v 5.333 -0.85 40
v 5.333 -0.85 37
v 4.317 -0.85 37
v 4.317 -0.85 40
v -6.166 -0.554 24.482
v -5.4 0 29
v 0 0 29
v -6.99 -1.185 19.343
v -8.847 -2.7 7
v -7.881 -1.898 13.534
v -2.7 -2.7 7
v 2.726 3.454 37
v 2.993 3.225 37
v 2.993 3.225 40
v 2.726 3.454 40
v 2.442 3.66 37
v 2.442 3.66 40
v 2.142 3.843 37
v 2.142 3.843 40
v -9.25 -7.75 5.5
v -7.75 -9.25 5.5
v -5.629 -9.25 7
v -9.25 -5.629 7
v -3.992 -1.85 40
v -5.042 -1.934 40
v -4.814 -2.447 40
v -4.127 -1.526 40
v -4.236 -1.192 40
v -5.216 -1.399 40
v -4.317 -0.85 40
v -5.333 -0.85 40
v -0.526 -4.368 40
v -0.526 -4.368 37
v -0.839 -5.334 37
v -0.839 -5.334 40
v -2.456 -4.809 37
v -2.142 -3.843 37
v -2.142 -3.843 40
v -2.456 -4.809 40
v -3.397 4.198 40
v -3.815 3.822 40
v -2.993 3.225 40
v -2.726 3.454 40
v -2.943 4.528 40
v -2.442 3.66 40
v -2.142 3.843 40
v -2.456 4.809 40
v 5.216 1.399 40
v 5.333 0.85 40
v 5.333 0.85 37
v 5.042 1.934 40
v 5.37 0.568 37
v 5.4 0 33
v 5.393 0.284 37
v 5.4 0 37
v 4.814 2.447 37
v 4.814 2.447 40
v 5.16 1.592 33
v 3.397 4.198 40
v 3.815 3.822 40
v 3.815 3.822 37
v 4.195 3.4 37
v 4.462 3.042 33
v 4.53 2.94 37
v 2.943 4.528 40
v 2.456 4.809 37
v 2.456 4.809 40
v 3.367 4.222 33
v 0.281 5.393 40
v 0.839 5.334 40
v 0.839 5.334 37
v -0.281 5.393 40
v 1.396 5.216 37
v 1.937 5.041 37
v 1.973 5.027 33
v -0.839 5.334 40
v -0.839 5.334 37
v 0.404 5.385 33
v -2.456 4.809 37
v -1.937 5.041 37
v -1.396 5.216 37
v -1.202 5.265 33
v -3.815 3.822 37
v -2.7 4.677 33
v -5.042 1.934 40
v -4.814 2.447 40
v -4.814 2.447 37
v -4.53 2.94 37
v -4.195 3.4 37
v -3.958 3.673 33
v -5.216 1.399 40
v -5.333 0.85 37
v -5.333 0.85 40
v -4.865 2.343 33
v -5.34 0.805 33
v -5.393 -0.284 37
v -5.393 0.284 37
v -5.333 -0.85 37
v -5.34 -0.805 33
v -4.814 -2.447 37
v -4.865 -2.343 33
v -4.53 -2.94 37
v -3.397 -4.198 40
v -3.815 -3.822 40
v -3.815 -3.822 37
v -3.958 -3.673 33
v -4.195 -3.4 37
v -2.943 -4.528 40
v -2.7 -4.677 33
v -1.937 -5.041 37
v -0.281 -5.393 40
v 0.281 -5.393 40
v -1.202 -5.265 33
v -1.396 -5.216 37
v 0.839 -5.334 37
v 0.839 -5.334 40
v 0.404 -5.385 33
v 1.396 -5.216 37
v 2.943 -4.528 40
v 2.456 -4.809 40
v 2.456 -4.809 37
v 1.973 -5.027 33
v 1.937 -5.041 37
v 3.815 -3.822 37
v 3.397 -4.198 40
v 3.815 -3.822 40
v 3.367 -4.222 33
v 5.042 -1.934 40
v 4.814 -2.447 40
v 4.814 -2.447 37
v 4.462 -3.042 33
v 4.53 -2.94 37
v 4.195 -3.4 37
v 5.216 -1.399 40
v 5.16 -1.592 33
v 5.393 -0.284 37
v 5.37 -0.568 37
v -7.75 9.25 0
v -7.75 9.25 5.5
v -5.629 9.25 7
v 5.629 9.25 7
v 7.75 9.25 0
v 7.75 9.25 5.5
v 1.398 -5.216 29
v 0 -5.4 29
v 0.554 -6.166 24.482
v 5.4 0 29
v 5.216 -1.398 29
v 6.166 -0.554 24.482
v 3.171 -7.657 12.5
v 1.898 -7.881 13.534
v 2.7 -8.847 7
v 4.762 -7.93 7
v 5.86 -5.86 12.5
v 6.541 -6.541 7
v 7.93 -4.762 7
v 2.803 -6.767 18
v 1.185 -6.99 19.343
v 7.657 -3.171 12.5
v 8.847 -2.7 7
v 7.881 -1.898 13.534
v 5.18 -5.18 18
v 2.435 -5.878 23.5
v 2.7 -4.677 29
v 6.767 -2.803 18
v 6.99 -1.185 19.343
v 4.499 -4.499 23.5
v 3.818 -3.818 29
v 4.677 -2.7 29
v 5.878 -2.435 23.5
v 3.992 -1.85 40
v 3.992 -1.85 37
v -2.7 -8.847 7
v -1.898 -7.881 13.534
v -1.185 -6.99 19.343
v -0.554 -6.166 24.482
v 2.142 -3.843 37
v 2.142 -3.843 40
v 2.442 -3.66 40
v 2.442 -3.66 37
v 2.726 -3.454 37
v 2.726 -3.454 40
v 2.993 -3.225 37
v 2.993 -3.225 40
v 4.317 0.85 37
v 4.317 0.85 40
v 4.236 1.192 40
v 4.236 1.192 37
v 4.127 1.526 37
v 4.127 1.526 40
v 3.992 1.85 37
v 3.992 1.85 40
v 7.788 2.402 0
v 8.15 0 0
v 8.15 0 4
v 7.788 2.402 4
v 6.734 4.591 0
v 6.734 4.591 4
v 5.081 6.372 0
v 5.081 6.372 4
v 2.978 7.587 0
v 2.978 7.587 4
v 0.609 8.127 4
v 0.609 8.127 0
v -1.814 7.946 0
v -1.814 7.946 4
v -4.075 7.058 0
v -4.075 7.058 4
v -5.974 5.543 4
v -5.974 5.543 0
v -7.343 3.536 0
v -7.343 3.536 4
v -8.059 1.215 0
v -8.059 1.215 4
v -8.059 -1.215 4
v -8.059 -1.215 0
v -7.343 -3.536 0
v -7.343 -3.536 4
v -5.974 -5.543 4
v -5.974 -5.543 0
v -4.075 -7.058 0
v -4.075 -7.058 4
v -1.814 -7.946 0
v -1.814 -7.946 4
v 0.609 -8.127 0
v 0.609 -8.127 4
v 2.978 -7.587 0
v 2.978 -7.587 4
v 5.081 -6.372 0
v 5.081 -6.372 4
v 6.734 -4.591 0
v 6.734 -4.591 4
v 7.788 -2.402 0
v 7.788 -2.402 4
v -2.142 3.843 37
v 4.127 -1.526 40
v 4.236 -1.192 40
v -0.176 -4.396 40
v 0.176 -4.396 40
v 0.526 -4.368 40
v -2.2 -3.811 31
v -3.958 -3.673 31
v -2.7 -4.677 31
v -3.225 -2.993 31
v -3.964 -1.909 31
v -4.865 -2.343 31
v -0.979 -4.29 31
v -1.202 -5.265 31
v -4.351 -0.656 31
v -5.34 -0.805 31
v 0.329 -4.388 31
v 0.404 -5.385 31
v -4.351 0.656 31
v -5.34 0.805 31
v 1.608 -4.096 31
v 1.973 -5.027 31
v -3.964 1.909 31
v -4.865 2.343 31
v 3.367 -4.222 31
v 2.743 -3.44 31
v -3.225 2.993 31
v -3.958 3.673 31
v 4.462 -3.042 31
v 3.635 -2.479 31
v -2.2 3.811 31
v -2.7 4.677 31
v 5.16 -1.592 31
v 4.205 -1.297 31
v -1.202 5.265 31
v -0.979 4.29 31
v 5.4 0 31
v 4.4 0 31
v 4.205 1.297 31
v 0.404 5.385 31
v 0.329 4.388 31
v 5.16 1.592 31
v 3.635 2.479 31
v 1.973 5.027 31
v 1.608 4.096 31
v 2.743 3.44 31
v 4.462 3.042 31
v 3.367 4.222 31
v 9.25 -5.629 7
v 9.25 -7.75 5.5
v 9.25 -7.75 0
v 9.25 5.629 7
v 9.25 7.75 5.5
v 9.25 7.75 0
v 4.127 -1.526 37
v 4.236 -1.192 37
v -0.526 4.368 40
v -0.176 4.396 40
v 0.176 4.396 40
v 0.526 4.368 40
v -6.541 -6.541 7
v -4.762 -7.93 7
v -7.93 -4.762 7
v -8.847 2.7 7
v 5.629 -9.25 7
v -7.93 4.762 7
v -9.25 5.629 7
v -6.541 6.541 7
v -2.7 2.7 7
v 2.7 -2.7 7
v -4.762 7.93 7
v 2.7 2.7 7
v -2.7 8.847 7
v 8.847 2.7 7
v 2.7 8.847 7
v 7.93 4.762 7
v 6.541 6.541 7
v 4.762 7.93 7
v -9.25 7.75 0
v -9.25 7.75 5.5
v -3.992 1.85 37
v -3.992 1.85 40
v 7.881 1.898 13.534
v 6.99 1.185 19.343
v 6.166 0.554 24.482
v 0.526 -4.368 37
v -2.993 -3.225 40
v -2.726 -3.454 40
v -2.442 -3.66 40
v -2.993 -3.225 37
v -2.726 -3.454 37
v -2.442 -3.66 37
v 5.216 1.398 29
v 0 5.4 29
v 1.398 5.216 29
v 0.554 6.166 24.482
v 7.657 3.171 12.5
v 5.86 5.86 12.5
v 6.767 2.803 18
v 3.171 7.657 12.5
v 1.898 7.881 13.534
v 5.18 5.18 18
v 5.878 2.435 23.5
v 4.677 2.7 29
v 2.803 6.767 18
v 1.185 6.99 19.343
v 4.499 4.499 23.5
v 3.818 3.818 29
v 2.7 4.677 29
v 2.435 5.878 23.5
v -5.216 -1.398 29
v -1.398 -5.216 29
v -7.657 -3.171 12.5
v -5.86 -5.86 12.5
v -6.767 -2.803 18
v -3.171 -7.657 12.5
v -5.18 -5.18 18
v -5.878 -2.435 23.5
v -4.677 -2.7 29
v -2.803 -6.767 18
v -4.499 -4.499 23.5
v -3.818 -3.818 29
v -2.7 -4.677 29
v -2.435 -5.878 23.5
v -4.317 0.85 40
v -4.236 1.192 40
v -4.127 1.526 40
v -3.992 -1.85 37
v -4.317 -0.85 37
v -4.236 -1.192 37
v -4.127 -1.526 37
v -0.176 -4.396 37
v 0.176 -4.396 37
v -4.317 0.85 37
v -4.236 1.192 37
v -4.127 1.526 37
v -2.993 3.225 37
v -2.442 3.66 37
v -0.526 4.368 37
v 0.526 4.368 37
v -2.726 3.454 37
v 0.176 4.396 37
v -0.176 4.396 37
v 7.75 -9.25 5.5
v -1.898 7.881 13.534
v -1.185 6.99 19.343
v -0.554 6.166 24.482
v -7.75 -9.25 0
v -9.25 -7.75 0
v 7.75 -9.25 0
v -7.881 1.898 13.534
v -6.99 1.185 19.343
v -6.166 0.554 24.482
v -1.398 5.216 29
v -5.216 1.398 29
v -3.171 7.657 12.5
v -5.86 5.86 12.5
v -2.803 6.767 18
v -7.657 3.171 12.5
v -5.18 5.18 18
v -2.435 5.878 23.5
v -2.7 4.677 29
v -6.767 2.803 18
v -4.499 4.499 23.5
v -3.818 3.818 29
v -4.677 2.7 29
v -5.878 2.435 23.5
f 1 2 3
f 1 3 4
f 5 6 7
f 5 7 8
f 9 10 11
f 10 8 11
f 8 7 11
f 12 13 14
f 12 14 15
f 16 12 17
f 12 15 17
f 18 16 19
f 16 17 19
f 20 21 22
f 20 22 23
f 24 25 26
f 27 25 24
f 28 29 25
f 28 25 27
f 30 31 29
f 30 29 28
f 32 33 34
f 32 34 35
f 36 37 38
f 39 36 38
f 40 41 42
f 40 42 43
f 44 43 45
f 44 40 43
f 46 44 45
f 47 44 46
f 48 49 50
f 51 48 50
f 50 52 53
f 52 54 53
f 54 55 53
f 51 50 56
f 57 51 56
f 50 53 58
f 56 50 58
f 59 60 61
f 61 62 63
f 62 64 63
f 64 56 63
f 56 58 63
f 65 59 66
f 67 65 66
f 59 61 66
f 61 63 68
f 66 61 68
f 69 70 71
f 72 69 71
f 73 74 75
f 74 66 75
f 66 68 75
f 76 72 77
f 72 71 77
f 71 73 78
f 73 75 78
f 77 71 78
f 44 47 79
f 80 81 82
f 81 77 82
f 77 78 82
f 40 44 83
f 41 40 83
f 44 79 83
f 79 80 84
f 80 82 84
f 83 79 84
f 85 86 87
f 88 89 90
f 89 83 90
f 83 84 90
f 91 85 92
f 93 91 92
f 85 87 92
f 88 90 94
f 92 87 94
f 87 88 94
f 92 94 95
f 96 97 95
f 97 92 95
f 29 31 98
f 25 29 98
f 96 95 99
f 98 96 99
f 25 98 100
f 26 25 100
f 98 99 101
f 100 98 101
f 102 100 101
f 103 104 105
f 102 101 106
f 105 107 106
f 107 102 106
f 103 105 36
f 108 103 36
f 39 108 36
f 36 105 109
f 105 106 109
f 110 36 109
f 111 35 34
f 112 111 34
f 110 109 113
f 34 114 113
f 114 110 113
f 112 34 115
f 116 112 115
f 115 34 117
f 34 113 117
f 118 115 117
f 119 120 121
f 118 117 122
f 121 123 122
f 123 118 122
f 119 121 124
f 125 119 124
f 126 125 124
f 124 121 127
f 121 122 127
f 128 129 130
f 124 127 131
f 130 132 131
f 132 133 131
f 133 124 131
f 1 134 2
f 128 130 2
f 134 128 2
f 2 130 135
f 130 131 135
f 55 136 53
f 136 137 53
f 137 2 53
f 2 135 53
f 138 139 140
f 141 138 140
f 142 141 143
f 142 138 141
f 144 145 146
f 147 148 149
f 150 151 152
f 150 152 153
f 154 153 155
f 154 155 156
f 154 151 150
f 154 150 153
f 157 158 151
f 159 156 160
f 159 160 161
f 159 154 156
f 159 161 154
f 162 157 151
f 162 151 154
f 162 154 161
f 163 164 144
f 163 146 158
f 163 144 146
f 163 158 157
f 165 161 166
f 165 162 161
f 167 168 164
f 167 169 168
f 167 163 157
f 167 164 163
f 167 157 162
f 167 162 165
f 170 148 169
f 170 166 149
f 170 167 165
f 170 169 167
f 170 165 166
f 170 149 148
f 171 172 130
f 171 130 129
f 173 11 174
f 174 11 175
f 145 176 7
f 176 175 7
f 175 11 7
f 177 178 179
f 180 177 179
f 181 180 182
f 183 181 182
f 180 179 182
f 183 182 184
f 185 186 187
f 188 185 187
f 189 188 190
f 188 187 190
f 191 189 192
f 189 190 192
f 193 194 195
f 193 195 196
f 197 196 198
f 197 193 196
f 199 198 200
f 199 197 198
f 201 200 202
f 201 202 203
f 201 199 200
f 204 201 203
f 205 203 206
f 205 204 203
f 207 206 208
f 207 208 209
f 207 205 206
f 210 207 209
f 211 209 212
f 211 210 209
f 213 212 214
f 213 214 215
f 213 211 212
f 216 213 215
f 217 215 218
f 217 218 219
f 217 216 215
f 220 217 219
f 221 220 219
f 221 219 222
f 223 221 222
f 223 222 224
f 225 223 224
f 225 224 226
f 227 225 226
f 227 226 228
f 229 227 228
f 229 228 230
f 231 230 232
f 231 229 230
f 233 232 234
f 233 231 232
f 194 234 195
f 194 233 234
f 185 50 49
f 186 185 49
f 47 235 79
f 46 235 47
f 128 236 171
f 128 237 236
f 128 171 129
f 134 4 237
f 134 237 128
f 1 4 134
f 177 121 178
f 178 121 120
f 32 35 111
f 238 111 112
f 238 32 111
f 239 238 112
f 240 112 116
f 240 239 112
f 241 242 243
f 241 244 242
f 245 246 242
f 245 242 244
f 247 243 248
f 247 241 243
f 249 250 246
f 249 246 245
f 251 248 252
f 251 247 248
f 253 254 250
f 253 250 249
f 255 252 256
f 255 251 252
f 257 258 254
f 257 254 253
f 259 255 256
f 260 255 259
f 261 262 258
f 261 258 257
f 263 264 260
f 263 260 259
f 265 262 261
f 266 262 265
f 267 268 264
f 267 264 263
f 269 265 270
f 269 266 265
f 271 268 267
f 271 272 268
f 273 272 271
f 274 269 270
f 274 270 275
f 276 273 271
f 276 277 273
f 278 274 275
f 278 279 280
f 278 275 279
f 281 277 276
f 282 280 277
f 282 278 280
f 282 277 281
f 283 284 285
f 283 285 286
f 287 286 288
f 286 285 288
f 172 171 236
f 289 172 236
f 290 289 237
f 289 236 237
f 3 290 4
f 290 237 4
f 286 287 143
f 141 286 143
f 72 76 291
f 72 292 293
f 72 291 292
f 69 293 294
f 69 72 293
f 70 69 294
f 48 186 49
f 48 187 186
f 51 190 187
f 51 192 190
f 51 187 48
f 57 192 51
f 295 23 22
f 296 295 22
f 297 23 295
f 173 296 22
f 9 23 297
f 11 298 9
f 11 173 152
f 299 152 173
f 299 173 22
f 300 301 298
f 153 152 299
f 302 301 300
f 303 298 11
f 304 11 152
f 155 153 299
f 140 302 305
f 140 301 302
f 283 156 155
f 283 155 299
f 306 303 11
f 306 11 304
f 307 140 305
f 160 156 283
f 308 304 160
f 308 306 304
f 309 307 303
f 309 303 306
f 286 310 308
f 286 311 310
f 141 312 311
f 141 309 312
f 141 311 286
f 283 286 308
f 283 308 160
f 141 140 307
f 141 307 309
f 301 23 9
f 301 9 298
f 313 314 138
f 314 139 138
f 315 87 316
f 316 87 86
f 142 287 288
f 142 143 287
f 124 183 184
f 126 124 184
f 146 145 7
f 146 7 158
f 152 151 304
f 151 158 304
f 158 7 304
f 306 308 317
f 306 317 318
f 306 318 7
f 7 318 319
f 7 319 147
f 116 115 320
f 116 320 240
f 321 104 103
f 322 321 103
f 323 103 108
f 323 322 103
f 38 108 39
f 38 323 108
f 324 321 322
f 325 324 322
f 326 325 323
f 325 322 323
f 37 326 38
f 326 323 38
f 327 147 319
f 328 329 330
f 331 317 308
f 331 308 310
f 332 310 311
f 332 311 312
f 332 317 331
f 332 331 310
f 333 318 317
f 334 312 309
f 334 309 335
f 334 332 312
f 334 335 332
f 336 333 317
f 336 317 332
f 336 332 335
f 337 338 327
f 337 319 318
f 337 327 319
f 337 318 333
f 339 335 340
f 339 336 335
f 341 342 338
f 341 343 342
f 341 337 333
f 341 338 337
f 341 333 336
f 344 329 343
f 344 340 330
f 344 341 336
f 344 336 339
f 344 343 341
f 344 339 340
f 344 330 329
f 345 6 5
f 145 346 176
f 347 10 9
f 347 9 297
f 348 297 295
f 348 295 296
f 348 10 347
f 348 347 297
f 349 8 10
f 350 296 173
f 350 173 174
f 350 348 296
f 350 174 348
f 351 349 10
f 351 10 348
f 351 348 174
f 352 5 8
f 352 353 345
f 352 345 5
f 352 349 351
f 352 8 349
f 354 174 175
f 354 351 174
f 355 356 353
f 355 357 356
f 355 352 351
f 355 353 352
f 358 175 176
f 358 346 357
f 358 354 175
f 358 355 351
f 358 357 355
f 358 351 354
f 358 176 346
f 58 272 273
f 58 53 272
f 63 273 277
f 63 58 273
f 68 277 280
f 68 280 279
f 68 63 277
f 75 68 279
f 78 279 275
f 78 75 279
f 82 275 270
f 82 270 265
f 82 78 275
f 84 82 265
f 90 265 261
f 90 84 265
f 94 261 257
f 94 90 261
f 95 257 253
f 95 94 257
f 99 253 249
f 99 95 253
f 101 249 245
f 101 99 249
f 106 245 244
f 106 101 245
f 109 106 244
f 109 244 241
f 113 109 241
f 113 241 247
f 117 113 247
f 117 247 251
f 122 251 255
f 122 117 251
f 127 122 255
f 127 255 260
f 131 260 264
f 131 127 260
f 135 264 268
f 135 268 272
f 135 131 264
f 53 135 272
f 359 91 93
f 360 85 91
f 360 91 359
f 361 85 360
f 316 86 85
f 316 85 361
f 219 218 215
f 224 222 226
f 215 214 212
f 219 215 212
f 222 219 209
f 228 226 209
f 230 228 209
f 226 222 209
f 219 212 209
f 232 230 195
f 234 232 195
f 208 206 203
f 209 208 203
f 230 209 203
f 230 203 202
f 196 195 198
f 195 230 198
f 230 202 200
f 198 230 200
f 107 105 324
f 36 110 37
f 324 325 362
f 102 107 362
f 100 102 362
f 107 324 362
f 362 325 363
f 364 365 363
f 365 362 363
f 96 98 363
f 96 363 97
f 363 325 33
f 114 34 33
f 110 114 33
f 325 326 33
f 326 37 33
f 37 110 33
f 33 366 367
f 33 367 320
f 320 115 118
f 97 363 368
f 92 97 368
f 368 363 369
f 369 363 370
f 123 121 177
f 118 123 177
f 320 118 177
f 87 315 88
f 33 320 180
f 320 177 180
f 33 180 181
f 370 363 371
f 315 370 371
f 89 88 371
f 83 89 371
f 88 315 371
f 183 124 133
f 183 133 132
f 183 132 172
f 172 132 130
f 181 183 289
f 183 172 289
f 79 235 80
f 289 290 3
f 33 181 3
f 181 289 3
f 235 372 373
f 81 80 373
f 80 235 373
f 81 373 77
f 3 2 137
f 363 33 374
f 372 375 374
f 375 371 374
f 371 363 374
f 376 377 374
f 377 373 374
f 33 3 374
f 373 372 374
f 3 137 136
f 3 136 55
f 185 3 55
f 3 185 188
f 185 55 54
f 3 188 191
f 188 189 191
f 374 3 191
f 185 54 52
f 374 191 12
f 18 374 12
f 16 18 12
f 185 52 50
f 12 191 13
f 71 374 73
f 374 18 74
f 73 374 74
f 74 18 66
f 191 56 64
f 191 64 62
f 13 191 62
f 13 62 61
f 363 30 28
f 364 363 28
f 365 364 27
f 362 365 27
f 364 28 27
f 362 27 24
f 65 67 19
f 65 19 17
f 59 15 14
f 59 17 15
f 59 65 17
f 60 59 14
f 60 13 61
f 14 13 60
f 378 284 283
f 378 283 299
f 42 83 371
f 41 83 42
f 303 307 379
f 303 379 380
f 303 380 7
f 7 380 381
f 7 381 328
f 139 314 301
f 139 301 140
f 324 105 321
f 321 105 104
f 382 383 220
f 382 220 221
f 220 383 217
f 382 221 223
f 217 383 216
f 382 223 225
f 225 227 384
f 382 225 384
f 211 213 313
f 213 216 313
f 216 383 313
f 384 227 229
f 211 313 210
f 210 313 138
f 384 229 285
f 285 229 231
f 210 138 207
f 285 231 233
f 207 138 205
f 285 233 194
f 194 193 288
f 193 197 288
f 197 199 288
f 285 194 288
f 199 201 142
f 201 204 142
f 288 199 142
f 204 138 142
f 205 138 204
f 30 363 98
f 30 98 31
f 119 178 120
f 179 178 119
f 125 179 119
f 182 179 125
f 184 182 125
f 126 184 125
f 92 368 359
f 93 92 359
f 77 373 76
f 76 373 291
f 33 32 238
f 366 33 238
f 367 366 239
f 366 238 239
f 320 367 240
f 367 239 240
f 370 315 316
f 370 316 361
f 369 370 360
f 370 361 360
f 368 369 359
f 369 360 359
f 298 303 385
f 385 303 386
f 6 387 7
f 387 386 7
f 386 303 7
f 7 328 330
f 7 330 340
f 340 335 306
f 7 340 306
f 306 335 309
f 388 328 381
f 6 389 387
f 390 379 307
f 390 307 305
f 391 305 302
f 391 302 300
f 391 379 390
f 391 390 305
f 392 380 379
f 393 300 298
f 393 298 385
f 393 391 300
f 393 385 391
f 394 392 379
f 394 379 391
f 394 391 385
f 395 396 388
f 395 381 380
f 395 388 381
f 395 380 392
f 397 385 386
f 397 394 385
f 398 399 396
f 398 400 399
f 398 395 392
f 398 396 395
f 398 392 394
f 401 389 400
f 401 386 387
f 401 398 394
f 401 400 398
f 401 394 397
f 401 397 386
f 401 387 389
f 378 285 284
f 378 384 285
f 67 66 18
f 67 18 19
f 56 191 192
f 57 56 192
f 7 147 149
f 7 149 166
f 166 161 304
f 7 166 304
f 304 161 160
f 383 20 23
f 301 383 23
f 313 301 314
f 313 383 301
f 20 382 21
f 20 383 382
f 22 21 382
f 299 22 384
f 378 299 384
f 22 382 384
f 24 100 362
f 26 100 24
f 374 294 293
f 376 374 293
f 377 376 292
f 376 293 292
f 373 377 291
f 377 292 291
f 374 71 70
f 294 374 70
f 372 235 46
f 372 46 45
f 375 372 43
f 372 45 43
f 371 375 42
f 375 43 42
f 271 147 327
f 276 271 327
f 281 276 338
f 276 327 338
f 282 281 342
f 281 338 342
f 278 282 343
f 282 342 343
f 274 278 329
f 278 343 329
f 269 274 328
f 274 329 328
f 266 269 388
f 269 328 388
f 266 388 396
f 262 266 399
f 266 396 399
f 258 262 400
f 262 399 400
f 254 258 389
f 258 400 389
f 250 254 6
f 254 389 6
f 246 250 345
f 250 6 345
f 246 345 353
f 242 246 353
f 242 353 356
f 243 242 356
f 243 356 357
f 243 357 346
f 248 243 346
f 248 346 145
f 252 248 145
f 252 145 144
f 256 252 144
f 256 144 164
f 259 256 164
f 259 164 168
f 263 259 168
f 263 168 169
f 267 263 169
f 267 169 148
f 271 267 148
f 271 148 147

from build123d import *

# Parameters (mm, degrees)
SKETCH_W              = 18.5
SKETCH_H              = 18.5
SKETCH_R              = 8.15
PAD_DEPTH             = 4
SKETCH001_W           = 18.5
SKETCH001_H           = 18.5
PAD001_DEPTH          = 3
SKETCH002_R           = 9.25
SKETCH003_R           = 5.4
SKETCH005_R           = 5.4
PAD002_DEPTH          = 2
CHAMFER_SIZE          = 1.5
CHAMFER001_SIZE       = 1.5
POCKET_DEPTH          = 99.630527
POLARPATTERN_COUNT    = 4
SKETCH007_R           = 4.4
SKETCH008_R           = 5.4
SKETCH009_R           = 5.4
PAD003_DEPTH          = 7
SKETCH010_R           = 4.4
POCKET001_DEPTH       = 3
SKETCH011_W           = 1.7
SKETCH011_H           = 3
POCKET002_DEPTH       = 114.093887
POLARPATTERN001_COUNT = 5


with BuildPart() as part:
    # Sketch → Pad (new body)
    with BuildSketch(Plane.XY):
        Rectangle(SKETCH_W, SKETCH_H)
        Circle(SKETCH_R, mode=Mode.SUBTRACT)
    extrude(amount=PAD_DEPTH)

    # Sketch001 (on Face7 of Pad) → Pad001 (join)
    with BuildSketch(Plane.XY.offset(4)):
        Rectangle(SKETCH001_W, SKETCH001_H)
    extrude(amount=PAD001_DEPTH)

    # Sketch002 (on Face10 of Pad001) → AdditiveLoft section 0
    with BuildSketch(Plane.XY.offset(7)):
        Circle(SKETCH002_R)
    # Sketch003 (on Face10 of Pad001) → AdditiveLoft section 1
    with BuildSketch(Plane.XY.offset(29)):
        Circle(SKETCH003_R)
    loft()

    # Sketch005 (on Face17 of AdditiveLoft) → Pad002 (join)
    with BuildSketch(Plane.XY.offset(29)):
        Circle(SKETCH005_R)
    extrude(amount=PAD002_DEPTH)

    # Chamfer
    chamfer_edges = [part.edges().sort_by_distance(p)[0] for p in [
        (-9.25, -9.25, 5.5),
        (-9.25, -9.25, 2),
        (9.25, -9.25, 5.5),
        (9.25, -9.25, 2),
        (9.25, 9.25, 2),
        (9.25, 9.25, 5.5),
        (-9.25, 9.25, 5.5),
        (-9.25, 9.25, 2),
    ]]
    chamfer(chamfer_edges, length=CHAMFER_SIZE)

    # Chamfer001
    chamfer001_edges = [part.edges().sort_by_distance(p)[0] for p in [
        (8.5, -8.5, 7),
        (-8.5, -8.5, 7),
        (-8.5, 8.5, 7),
        (8.5, 8.5, 7),
    ]]
    chamfer(chamfer001_edges, length=CHAMFER001_SIZE)

    # Sketch006 (on Face19 of Chamfer001) → Pocket (cut, through all)
    with BuildSketch(Plane.YZ.offset(9.25)):
        Polygon((0, 29), (-2.7, 7), (2.7, 7), align=None)
    pocket = extrude(amount=-POCKET_DEPTH, mode=Mode.SUBTRACT)

    # PolarPattern: Pocket ×4 about axis
    polarpattern_axis = Axis((0, 0, 0), (0, 0, 1))
    for i in range(1, POLARPATTERN_COUNT):
        add(pocket.rotate(polarpattern_axis, i * 360 / POLARPATTERN_COUNT), mode=Mode.SUBTRACT)

    # Sketch007 (on Face47 of PolarPattern) → AdditiveLoft001 section 0
    with BuildSketch(Plane.XY.offset(31)):
        Circle(SKETCH007_R)
    # Sketch008 → AdditiveLoft001 section 1
    with BuildSketch(Plane.XY.offset(33)):
        Circle(SKETCH008_R)
    loft()

    # Sketch009 (on Face56 of AdditiveLoft001) → Pad003 (join)
    with BuildSketch(Plane.XY.offset(33)):
        Circle(SKETCH009_R)
    extrude(amount=PAD003_DEPTH)

    # Sketch010 (on Face57 of Pad003) → Pocket001 (cut)
    with BuildSketch(Plane.XY.offset(40)):
        Circle(SKETCH010_R)
    extrude(amount=-POCKET001_DEPTH, mode=Mode.SUBTRACT)

    # Sketch011 (on Face26 of Pocket001) → Pocket002 (cut, through all)
    with BuildSketch(Plane.YZ.offset(9.25)):
        with Locations((0, 38.5)):
            Rectangle(SKETCH011_W, SKETCH011_H)
    pocket002 = extrude(amount=-POCKET002_DEPTH, mode=Mode.SUBTRACT)

    # PolarPattern001: Pocket002 ×5 about axis
    polarpattern001_axis = Axis((0, 0, 0), (0, 0, 1))
    for i in range(1, POLARPATTERN001_COUNT):
        add(pocket002.rotate(polarpattern001_axis, i * 360 / POLARPATTERN001_COUNT), mode=Mode.SUBTRACT)


solid = part.part
